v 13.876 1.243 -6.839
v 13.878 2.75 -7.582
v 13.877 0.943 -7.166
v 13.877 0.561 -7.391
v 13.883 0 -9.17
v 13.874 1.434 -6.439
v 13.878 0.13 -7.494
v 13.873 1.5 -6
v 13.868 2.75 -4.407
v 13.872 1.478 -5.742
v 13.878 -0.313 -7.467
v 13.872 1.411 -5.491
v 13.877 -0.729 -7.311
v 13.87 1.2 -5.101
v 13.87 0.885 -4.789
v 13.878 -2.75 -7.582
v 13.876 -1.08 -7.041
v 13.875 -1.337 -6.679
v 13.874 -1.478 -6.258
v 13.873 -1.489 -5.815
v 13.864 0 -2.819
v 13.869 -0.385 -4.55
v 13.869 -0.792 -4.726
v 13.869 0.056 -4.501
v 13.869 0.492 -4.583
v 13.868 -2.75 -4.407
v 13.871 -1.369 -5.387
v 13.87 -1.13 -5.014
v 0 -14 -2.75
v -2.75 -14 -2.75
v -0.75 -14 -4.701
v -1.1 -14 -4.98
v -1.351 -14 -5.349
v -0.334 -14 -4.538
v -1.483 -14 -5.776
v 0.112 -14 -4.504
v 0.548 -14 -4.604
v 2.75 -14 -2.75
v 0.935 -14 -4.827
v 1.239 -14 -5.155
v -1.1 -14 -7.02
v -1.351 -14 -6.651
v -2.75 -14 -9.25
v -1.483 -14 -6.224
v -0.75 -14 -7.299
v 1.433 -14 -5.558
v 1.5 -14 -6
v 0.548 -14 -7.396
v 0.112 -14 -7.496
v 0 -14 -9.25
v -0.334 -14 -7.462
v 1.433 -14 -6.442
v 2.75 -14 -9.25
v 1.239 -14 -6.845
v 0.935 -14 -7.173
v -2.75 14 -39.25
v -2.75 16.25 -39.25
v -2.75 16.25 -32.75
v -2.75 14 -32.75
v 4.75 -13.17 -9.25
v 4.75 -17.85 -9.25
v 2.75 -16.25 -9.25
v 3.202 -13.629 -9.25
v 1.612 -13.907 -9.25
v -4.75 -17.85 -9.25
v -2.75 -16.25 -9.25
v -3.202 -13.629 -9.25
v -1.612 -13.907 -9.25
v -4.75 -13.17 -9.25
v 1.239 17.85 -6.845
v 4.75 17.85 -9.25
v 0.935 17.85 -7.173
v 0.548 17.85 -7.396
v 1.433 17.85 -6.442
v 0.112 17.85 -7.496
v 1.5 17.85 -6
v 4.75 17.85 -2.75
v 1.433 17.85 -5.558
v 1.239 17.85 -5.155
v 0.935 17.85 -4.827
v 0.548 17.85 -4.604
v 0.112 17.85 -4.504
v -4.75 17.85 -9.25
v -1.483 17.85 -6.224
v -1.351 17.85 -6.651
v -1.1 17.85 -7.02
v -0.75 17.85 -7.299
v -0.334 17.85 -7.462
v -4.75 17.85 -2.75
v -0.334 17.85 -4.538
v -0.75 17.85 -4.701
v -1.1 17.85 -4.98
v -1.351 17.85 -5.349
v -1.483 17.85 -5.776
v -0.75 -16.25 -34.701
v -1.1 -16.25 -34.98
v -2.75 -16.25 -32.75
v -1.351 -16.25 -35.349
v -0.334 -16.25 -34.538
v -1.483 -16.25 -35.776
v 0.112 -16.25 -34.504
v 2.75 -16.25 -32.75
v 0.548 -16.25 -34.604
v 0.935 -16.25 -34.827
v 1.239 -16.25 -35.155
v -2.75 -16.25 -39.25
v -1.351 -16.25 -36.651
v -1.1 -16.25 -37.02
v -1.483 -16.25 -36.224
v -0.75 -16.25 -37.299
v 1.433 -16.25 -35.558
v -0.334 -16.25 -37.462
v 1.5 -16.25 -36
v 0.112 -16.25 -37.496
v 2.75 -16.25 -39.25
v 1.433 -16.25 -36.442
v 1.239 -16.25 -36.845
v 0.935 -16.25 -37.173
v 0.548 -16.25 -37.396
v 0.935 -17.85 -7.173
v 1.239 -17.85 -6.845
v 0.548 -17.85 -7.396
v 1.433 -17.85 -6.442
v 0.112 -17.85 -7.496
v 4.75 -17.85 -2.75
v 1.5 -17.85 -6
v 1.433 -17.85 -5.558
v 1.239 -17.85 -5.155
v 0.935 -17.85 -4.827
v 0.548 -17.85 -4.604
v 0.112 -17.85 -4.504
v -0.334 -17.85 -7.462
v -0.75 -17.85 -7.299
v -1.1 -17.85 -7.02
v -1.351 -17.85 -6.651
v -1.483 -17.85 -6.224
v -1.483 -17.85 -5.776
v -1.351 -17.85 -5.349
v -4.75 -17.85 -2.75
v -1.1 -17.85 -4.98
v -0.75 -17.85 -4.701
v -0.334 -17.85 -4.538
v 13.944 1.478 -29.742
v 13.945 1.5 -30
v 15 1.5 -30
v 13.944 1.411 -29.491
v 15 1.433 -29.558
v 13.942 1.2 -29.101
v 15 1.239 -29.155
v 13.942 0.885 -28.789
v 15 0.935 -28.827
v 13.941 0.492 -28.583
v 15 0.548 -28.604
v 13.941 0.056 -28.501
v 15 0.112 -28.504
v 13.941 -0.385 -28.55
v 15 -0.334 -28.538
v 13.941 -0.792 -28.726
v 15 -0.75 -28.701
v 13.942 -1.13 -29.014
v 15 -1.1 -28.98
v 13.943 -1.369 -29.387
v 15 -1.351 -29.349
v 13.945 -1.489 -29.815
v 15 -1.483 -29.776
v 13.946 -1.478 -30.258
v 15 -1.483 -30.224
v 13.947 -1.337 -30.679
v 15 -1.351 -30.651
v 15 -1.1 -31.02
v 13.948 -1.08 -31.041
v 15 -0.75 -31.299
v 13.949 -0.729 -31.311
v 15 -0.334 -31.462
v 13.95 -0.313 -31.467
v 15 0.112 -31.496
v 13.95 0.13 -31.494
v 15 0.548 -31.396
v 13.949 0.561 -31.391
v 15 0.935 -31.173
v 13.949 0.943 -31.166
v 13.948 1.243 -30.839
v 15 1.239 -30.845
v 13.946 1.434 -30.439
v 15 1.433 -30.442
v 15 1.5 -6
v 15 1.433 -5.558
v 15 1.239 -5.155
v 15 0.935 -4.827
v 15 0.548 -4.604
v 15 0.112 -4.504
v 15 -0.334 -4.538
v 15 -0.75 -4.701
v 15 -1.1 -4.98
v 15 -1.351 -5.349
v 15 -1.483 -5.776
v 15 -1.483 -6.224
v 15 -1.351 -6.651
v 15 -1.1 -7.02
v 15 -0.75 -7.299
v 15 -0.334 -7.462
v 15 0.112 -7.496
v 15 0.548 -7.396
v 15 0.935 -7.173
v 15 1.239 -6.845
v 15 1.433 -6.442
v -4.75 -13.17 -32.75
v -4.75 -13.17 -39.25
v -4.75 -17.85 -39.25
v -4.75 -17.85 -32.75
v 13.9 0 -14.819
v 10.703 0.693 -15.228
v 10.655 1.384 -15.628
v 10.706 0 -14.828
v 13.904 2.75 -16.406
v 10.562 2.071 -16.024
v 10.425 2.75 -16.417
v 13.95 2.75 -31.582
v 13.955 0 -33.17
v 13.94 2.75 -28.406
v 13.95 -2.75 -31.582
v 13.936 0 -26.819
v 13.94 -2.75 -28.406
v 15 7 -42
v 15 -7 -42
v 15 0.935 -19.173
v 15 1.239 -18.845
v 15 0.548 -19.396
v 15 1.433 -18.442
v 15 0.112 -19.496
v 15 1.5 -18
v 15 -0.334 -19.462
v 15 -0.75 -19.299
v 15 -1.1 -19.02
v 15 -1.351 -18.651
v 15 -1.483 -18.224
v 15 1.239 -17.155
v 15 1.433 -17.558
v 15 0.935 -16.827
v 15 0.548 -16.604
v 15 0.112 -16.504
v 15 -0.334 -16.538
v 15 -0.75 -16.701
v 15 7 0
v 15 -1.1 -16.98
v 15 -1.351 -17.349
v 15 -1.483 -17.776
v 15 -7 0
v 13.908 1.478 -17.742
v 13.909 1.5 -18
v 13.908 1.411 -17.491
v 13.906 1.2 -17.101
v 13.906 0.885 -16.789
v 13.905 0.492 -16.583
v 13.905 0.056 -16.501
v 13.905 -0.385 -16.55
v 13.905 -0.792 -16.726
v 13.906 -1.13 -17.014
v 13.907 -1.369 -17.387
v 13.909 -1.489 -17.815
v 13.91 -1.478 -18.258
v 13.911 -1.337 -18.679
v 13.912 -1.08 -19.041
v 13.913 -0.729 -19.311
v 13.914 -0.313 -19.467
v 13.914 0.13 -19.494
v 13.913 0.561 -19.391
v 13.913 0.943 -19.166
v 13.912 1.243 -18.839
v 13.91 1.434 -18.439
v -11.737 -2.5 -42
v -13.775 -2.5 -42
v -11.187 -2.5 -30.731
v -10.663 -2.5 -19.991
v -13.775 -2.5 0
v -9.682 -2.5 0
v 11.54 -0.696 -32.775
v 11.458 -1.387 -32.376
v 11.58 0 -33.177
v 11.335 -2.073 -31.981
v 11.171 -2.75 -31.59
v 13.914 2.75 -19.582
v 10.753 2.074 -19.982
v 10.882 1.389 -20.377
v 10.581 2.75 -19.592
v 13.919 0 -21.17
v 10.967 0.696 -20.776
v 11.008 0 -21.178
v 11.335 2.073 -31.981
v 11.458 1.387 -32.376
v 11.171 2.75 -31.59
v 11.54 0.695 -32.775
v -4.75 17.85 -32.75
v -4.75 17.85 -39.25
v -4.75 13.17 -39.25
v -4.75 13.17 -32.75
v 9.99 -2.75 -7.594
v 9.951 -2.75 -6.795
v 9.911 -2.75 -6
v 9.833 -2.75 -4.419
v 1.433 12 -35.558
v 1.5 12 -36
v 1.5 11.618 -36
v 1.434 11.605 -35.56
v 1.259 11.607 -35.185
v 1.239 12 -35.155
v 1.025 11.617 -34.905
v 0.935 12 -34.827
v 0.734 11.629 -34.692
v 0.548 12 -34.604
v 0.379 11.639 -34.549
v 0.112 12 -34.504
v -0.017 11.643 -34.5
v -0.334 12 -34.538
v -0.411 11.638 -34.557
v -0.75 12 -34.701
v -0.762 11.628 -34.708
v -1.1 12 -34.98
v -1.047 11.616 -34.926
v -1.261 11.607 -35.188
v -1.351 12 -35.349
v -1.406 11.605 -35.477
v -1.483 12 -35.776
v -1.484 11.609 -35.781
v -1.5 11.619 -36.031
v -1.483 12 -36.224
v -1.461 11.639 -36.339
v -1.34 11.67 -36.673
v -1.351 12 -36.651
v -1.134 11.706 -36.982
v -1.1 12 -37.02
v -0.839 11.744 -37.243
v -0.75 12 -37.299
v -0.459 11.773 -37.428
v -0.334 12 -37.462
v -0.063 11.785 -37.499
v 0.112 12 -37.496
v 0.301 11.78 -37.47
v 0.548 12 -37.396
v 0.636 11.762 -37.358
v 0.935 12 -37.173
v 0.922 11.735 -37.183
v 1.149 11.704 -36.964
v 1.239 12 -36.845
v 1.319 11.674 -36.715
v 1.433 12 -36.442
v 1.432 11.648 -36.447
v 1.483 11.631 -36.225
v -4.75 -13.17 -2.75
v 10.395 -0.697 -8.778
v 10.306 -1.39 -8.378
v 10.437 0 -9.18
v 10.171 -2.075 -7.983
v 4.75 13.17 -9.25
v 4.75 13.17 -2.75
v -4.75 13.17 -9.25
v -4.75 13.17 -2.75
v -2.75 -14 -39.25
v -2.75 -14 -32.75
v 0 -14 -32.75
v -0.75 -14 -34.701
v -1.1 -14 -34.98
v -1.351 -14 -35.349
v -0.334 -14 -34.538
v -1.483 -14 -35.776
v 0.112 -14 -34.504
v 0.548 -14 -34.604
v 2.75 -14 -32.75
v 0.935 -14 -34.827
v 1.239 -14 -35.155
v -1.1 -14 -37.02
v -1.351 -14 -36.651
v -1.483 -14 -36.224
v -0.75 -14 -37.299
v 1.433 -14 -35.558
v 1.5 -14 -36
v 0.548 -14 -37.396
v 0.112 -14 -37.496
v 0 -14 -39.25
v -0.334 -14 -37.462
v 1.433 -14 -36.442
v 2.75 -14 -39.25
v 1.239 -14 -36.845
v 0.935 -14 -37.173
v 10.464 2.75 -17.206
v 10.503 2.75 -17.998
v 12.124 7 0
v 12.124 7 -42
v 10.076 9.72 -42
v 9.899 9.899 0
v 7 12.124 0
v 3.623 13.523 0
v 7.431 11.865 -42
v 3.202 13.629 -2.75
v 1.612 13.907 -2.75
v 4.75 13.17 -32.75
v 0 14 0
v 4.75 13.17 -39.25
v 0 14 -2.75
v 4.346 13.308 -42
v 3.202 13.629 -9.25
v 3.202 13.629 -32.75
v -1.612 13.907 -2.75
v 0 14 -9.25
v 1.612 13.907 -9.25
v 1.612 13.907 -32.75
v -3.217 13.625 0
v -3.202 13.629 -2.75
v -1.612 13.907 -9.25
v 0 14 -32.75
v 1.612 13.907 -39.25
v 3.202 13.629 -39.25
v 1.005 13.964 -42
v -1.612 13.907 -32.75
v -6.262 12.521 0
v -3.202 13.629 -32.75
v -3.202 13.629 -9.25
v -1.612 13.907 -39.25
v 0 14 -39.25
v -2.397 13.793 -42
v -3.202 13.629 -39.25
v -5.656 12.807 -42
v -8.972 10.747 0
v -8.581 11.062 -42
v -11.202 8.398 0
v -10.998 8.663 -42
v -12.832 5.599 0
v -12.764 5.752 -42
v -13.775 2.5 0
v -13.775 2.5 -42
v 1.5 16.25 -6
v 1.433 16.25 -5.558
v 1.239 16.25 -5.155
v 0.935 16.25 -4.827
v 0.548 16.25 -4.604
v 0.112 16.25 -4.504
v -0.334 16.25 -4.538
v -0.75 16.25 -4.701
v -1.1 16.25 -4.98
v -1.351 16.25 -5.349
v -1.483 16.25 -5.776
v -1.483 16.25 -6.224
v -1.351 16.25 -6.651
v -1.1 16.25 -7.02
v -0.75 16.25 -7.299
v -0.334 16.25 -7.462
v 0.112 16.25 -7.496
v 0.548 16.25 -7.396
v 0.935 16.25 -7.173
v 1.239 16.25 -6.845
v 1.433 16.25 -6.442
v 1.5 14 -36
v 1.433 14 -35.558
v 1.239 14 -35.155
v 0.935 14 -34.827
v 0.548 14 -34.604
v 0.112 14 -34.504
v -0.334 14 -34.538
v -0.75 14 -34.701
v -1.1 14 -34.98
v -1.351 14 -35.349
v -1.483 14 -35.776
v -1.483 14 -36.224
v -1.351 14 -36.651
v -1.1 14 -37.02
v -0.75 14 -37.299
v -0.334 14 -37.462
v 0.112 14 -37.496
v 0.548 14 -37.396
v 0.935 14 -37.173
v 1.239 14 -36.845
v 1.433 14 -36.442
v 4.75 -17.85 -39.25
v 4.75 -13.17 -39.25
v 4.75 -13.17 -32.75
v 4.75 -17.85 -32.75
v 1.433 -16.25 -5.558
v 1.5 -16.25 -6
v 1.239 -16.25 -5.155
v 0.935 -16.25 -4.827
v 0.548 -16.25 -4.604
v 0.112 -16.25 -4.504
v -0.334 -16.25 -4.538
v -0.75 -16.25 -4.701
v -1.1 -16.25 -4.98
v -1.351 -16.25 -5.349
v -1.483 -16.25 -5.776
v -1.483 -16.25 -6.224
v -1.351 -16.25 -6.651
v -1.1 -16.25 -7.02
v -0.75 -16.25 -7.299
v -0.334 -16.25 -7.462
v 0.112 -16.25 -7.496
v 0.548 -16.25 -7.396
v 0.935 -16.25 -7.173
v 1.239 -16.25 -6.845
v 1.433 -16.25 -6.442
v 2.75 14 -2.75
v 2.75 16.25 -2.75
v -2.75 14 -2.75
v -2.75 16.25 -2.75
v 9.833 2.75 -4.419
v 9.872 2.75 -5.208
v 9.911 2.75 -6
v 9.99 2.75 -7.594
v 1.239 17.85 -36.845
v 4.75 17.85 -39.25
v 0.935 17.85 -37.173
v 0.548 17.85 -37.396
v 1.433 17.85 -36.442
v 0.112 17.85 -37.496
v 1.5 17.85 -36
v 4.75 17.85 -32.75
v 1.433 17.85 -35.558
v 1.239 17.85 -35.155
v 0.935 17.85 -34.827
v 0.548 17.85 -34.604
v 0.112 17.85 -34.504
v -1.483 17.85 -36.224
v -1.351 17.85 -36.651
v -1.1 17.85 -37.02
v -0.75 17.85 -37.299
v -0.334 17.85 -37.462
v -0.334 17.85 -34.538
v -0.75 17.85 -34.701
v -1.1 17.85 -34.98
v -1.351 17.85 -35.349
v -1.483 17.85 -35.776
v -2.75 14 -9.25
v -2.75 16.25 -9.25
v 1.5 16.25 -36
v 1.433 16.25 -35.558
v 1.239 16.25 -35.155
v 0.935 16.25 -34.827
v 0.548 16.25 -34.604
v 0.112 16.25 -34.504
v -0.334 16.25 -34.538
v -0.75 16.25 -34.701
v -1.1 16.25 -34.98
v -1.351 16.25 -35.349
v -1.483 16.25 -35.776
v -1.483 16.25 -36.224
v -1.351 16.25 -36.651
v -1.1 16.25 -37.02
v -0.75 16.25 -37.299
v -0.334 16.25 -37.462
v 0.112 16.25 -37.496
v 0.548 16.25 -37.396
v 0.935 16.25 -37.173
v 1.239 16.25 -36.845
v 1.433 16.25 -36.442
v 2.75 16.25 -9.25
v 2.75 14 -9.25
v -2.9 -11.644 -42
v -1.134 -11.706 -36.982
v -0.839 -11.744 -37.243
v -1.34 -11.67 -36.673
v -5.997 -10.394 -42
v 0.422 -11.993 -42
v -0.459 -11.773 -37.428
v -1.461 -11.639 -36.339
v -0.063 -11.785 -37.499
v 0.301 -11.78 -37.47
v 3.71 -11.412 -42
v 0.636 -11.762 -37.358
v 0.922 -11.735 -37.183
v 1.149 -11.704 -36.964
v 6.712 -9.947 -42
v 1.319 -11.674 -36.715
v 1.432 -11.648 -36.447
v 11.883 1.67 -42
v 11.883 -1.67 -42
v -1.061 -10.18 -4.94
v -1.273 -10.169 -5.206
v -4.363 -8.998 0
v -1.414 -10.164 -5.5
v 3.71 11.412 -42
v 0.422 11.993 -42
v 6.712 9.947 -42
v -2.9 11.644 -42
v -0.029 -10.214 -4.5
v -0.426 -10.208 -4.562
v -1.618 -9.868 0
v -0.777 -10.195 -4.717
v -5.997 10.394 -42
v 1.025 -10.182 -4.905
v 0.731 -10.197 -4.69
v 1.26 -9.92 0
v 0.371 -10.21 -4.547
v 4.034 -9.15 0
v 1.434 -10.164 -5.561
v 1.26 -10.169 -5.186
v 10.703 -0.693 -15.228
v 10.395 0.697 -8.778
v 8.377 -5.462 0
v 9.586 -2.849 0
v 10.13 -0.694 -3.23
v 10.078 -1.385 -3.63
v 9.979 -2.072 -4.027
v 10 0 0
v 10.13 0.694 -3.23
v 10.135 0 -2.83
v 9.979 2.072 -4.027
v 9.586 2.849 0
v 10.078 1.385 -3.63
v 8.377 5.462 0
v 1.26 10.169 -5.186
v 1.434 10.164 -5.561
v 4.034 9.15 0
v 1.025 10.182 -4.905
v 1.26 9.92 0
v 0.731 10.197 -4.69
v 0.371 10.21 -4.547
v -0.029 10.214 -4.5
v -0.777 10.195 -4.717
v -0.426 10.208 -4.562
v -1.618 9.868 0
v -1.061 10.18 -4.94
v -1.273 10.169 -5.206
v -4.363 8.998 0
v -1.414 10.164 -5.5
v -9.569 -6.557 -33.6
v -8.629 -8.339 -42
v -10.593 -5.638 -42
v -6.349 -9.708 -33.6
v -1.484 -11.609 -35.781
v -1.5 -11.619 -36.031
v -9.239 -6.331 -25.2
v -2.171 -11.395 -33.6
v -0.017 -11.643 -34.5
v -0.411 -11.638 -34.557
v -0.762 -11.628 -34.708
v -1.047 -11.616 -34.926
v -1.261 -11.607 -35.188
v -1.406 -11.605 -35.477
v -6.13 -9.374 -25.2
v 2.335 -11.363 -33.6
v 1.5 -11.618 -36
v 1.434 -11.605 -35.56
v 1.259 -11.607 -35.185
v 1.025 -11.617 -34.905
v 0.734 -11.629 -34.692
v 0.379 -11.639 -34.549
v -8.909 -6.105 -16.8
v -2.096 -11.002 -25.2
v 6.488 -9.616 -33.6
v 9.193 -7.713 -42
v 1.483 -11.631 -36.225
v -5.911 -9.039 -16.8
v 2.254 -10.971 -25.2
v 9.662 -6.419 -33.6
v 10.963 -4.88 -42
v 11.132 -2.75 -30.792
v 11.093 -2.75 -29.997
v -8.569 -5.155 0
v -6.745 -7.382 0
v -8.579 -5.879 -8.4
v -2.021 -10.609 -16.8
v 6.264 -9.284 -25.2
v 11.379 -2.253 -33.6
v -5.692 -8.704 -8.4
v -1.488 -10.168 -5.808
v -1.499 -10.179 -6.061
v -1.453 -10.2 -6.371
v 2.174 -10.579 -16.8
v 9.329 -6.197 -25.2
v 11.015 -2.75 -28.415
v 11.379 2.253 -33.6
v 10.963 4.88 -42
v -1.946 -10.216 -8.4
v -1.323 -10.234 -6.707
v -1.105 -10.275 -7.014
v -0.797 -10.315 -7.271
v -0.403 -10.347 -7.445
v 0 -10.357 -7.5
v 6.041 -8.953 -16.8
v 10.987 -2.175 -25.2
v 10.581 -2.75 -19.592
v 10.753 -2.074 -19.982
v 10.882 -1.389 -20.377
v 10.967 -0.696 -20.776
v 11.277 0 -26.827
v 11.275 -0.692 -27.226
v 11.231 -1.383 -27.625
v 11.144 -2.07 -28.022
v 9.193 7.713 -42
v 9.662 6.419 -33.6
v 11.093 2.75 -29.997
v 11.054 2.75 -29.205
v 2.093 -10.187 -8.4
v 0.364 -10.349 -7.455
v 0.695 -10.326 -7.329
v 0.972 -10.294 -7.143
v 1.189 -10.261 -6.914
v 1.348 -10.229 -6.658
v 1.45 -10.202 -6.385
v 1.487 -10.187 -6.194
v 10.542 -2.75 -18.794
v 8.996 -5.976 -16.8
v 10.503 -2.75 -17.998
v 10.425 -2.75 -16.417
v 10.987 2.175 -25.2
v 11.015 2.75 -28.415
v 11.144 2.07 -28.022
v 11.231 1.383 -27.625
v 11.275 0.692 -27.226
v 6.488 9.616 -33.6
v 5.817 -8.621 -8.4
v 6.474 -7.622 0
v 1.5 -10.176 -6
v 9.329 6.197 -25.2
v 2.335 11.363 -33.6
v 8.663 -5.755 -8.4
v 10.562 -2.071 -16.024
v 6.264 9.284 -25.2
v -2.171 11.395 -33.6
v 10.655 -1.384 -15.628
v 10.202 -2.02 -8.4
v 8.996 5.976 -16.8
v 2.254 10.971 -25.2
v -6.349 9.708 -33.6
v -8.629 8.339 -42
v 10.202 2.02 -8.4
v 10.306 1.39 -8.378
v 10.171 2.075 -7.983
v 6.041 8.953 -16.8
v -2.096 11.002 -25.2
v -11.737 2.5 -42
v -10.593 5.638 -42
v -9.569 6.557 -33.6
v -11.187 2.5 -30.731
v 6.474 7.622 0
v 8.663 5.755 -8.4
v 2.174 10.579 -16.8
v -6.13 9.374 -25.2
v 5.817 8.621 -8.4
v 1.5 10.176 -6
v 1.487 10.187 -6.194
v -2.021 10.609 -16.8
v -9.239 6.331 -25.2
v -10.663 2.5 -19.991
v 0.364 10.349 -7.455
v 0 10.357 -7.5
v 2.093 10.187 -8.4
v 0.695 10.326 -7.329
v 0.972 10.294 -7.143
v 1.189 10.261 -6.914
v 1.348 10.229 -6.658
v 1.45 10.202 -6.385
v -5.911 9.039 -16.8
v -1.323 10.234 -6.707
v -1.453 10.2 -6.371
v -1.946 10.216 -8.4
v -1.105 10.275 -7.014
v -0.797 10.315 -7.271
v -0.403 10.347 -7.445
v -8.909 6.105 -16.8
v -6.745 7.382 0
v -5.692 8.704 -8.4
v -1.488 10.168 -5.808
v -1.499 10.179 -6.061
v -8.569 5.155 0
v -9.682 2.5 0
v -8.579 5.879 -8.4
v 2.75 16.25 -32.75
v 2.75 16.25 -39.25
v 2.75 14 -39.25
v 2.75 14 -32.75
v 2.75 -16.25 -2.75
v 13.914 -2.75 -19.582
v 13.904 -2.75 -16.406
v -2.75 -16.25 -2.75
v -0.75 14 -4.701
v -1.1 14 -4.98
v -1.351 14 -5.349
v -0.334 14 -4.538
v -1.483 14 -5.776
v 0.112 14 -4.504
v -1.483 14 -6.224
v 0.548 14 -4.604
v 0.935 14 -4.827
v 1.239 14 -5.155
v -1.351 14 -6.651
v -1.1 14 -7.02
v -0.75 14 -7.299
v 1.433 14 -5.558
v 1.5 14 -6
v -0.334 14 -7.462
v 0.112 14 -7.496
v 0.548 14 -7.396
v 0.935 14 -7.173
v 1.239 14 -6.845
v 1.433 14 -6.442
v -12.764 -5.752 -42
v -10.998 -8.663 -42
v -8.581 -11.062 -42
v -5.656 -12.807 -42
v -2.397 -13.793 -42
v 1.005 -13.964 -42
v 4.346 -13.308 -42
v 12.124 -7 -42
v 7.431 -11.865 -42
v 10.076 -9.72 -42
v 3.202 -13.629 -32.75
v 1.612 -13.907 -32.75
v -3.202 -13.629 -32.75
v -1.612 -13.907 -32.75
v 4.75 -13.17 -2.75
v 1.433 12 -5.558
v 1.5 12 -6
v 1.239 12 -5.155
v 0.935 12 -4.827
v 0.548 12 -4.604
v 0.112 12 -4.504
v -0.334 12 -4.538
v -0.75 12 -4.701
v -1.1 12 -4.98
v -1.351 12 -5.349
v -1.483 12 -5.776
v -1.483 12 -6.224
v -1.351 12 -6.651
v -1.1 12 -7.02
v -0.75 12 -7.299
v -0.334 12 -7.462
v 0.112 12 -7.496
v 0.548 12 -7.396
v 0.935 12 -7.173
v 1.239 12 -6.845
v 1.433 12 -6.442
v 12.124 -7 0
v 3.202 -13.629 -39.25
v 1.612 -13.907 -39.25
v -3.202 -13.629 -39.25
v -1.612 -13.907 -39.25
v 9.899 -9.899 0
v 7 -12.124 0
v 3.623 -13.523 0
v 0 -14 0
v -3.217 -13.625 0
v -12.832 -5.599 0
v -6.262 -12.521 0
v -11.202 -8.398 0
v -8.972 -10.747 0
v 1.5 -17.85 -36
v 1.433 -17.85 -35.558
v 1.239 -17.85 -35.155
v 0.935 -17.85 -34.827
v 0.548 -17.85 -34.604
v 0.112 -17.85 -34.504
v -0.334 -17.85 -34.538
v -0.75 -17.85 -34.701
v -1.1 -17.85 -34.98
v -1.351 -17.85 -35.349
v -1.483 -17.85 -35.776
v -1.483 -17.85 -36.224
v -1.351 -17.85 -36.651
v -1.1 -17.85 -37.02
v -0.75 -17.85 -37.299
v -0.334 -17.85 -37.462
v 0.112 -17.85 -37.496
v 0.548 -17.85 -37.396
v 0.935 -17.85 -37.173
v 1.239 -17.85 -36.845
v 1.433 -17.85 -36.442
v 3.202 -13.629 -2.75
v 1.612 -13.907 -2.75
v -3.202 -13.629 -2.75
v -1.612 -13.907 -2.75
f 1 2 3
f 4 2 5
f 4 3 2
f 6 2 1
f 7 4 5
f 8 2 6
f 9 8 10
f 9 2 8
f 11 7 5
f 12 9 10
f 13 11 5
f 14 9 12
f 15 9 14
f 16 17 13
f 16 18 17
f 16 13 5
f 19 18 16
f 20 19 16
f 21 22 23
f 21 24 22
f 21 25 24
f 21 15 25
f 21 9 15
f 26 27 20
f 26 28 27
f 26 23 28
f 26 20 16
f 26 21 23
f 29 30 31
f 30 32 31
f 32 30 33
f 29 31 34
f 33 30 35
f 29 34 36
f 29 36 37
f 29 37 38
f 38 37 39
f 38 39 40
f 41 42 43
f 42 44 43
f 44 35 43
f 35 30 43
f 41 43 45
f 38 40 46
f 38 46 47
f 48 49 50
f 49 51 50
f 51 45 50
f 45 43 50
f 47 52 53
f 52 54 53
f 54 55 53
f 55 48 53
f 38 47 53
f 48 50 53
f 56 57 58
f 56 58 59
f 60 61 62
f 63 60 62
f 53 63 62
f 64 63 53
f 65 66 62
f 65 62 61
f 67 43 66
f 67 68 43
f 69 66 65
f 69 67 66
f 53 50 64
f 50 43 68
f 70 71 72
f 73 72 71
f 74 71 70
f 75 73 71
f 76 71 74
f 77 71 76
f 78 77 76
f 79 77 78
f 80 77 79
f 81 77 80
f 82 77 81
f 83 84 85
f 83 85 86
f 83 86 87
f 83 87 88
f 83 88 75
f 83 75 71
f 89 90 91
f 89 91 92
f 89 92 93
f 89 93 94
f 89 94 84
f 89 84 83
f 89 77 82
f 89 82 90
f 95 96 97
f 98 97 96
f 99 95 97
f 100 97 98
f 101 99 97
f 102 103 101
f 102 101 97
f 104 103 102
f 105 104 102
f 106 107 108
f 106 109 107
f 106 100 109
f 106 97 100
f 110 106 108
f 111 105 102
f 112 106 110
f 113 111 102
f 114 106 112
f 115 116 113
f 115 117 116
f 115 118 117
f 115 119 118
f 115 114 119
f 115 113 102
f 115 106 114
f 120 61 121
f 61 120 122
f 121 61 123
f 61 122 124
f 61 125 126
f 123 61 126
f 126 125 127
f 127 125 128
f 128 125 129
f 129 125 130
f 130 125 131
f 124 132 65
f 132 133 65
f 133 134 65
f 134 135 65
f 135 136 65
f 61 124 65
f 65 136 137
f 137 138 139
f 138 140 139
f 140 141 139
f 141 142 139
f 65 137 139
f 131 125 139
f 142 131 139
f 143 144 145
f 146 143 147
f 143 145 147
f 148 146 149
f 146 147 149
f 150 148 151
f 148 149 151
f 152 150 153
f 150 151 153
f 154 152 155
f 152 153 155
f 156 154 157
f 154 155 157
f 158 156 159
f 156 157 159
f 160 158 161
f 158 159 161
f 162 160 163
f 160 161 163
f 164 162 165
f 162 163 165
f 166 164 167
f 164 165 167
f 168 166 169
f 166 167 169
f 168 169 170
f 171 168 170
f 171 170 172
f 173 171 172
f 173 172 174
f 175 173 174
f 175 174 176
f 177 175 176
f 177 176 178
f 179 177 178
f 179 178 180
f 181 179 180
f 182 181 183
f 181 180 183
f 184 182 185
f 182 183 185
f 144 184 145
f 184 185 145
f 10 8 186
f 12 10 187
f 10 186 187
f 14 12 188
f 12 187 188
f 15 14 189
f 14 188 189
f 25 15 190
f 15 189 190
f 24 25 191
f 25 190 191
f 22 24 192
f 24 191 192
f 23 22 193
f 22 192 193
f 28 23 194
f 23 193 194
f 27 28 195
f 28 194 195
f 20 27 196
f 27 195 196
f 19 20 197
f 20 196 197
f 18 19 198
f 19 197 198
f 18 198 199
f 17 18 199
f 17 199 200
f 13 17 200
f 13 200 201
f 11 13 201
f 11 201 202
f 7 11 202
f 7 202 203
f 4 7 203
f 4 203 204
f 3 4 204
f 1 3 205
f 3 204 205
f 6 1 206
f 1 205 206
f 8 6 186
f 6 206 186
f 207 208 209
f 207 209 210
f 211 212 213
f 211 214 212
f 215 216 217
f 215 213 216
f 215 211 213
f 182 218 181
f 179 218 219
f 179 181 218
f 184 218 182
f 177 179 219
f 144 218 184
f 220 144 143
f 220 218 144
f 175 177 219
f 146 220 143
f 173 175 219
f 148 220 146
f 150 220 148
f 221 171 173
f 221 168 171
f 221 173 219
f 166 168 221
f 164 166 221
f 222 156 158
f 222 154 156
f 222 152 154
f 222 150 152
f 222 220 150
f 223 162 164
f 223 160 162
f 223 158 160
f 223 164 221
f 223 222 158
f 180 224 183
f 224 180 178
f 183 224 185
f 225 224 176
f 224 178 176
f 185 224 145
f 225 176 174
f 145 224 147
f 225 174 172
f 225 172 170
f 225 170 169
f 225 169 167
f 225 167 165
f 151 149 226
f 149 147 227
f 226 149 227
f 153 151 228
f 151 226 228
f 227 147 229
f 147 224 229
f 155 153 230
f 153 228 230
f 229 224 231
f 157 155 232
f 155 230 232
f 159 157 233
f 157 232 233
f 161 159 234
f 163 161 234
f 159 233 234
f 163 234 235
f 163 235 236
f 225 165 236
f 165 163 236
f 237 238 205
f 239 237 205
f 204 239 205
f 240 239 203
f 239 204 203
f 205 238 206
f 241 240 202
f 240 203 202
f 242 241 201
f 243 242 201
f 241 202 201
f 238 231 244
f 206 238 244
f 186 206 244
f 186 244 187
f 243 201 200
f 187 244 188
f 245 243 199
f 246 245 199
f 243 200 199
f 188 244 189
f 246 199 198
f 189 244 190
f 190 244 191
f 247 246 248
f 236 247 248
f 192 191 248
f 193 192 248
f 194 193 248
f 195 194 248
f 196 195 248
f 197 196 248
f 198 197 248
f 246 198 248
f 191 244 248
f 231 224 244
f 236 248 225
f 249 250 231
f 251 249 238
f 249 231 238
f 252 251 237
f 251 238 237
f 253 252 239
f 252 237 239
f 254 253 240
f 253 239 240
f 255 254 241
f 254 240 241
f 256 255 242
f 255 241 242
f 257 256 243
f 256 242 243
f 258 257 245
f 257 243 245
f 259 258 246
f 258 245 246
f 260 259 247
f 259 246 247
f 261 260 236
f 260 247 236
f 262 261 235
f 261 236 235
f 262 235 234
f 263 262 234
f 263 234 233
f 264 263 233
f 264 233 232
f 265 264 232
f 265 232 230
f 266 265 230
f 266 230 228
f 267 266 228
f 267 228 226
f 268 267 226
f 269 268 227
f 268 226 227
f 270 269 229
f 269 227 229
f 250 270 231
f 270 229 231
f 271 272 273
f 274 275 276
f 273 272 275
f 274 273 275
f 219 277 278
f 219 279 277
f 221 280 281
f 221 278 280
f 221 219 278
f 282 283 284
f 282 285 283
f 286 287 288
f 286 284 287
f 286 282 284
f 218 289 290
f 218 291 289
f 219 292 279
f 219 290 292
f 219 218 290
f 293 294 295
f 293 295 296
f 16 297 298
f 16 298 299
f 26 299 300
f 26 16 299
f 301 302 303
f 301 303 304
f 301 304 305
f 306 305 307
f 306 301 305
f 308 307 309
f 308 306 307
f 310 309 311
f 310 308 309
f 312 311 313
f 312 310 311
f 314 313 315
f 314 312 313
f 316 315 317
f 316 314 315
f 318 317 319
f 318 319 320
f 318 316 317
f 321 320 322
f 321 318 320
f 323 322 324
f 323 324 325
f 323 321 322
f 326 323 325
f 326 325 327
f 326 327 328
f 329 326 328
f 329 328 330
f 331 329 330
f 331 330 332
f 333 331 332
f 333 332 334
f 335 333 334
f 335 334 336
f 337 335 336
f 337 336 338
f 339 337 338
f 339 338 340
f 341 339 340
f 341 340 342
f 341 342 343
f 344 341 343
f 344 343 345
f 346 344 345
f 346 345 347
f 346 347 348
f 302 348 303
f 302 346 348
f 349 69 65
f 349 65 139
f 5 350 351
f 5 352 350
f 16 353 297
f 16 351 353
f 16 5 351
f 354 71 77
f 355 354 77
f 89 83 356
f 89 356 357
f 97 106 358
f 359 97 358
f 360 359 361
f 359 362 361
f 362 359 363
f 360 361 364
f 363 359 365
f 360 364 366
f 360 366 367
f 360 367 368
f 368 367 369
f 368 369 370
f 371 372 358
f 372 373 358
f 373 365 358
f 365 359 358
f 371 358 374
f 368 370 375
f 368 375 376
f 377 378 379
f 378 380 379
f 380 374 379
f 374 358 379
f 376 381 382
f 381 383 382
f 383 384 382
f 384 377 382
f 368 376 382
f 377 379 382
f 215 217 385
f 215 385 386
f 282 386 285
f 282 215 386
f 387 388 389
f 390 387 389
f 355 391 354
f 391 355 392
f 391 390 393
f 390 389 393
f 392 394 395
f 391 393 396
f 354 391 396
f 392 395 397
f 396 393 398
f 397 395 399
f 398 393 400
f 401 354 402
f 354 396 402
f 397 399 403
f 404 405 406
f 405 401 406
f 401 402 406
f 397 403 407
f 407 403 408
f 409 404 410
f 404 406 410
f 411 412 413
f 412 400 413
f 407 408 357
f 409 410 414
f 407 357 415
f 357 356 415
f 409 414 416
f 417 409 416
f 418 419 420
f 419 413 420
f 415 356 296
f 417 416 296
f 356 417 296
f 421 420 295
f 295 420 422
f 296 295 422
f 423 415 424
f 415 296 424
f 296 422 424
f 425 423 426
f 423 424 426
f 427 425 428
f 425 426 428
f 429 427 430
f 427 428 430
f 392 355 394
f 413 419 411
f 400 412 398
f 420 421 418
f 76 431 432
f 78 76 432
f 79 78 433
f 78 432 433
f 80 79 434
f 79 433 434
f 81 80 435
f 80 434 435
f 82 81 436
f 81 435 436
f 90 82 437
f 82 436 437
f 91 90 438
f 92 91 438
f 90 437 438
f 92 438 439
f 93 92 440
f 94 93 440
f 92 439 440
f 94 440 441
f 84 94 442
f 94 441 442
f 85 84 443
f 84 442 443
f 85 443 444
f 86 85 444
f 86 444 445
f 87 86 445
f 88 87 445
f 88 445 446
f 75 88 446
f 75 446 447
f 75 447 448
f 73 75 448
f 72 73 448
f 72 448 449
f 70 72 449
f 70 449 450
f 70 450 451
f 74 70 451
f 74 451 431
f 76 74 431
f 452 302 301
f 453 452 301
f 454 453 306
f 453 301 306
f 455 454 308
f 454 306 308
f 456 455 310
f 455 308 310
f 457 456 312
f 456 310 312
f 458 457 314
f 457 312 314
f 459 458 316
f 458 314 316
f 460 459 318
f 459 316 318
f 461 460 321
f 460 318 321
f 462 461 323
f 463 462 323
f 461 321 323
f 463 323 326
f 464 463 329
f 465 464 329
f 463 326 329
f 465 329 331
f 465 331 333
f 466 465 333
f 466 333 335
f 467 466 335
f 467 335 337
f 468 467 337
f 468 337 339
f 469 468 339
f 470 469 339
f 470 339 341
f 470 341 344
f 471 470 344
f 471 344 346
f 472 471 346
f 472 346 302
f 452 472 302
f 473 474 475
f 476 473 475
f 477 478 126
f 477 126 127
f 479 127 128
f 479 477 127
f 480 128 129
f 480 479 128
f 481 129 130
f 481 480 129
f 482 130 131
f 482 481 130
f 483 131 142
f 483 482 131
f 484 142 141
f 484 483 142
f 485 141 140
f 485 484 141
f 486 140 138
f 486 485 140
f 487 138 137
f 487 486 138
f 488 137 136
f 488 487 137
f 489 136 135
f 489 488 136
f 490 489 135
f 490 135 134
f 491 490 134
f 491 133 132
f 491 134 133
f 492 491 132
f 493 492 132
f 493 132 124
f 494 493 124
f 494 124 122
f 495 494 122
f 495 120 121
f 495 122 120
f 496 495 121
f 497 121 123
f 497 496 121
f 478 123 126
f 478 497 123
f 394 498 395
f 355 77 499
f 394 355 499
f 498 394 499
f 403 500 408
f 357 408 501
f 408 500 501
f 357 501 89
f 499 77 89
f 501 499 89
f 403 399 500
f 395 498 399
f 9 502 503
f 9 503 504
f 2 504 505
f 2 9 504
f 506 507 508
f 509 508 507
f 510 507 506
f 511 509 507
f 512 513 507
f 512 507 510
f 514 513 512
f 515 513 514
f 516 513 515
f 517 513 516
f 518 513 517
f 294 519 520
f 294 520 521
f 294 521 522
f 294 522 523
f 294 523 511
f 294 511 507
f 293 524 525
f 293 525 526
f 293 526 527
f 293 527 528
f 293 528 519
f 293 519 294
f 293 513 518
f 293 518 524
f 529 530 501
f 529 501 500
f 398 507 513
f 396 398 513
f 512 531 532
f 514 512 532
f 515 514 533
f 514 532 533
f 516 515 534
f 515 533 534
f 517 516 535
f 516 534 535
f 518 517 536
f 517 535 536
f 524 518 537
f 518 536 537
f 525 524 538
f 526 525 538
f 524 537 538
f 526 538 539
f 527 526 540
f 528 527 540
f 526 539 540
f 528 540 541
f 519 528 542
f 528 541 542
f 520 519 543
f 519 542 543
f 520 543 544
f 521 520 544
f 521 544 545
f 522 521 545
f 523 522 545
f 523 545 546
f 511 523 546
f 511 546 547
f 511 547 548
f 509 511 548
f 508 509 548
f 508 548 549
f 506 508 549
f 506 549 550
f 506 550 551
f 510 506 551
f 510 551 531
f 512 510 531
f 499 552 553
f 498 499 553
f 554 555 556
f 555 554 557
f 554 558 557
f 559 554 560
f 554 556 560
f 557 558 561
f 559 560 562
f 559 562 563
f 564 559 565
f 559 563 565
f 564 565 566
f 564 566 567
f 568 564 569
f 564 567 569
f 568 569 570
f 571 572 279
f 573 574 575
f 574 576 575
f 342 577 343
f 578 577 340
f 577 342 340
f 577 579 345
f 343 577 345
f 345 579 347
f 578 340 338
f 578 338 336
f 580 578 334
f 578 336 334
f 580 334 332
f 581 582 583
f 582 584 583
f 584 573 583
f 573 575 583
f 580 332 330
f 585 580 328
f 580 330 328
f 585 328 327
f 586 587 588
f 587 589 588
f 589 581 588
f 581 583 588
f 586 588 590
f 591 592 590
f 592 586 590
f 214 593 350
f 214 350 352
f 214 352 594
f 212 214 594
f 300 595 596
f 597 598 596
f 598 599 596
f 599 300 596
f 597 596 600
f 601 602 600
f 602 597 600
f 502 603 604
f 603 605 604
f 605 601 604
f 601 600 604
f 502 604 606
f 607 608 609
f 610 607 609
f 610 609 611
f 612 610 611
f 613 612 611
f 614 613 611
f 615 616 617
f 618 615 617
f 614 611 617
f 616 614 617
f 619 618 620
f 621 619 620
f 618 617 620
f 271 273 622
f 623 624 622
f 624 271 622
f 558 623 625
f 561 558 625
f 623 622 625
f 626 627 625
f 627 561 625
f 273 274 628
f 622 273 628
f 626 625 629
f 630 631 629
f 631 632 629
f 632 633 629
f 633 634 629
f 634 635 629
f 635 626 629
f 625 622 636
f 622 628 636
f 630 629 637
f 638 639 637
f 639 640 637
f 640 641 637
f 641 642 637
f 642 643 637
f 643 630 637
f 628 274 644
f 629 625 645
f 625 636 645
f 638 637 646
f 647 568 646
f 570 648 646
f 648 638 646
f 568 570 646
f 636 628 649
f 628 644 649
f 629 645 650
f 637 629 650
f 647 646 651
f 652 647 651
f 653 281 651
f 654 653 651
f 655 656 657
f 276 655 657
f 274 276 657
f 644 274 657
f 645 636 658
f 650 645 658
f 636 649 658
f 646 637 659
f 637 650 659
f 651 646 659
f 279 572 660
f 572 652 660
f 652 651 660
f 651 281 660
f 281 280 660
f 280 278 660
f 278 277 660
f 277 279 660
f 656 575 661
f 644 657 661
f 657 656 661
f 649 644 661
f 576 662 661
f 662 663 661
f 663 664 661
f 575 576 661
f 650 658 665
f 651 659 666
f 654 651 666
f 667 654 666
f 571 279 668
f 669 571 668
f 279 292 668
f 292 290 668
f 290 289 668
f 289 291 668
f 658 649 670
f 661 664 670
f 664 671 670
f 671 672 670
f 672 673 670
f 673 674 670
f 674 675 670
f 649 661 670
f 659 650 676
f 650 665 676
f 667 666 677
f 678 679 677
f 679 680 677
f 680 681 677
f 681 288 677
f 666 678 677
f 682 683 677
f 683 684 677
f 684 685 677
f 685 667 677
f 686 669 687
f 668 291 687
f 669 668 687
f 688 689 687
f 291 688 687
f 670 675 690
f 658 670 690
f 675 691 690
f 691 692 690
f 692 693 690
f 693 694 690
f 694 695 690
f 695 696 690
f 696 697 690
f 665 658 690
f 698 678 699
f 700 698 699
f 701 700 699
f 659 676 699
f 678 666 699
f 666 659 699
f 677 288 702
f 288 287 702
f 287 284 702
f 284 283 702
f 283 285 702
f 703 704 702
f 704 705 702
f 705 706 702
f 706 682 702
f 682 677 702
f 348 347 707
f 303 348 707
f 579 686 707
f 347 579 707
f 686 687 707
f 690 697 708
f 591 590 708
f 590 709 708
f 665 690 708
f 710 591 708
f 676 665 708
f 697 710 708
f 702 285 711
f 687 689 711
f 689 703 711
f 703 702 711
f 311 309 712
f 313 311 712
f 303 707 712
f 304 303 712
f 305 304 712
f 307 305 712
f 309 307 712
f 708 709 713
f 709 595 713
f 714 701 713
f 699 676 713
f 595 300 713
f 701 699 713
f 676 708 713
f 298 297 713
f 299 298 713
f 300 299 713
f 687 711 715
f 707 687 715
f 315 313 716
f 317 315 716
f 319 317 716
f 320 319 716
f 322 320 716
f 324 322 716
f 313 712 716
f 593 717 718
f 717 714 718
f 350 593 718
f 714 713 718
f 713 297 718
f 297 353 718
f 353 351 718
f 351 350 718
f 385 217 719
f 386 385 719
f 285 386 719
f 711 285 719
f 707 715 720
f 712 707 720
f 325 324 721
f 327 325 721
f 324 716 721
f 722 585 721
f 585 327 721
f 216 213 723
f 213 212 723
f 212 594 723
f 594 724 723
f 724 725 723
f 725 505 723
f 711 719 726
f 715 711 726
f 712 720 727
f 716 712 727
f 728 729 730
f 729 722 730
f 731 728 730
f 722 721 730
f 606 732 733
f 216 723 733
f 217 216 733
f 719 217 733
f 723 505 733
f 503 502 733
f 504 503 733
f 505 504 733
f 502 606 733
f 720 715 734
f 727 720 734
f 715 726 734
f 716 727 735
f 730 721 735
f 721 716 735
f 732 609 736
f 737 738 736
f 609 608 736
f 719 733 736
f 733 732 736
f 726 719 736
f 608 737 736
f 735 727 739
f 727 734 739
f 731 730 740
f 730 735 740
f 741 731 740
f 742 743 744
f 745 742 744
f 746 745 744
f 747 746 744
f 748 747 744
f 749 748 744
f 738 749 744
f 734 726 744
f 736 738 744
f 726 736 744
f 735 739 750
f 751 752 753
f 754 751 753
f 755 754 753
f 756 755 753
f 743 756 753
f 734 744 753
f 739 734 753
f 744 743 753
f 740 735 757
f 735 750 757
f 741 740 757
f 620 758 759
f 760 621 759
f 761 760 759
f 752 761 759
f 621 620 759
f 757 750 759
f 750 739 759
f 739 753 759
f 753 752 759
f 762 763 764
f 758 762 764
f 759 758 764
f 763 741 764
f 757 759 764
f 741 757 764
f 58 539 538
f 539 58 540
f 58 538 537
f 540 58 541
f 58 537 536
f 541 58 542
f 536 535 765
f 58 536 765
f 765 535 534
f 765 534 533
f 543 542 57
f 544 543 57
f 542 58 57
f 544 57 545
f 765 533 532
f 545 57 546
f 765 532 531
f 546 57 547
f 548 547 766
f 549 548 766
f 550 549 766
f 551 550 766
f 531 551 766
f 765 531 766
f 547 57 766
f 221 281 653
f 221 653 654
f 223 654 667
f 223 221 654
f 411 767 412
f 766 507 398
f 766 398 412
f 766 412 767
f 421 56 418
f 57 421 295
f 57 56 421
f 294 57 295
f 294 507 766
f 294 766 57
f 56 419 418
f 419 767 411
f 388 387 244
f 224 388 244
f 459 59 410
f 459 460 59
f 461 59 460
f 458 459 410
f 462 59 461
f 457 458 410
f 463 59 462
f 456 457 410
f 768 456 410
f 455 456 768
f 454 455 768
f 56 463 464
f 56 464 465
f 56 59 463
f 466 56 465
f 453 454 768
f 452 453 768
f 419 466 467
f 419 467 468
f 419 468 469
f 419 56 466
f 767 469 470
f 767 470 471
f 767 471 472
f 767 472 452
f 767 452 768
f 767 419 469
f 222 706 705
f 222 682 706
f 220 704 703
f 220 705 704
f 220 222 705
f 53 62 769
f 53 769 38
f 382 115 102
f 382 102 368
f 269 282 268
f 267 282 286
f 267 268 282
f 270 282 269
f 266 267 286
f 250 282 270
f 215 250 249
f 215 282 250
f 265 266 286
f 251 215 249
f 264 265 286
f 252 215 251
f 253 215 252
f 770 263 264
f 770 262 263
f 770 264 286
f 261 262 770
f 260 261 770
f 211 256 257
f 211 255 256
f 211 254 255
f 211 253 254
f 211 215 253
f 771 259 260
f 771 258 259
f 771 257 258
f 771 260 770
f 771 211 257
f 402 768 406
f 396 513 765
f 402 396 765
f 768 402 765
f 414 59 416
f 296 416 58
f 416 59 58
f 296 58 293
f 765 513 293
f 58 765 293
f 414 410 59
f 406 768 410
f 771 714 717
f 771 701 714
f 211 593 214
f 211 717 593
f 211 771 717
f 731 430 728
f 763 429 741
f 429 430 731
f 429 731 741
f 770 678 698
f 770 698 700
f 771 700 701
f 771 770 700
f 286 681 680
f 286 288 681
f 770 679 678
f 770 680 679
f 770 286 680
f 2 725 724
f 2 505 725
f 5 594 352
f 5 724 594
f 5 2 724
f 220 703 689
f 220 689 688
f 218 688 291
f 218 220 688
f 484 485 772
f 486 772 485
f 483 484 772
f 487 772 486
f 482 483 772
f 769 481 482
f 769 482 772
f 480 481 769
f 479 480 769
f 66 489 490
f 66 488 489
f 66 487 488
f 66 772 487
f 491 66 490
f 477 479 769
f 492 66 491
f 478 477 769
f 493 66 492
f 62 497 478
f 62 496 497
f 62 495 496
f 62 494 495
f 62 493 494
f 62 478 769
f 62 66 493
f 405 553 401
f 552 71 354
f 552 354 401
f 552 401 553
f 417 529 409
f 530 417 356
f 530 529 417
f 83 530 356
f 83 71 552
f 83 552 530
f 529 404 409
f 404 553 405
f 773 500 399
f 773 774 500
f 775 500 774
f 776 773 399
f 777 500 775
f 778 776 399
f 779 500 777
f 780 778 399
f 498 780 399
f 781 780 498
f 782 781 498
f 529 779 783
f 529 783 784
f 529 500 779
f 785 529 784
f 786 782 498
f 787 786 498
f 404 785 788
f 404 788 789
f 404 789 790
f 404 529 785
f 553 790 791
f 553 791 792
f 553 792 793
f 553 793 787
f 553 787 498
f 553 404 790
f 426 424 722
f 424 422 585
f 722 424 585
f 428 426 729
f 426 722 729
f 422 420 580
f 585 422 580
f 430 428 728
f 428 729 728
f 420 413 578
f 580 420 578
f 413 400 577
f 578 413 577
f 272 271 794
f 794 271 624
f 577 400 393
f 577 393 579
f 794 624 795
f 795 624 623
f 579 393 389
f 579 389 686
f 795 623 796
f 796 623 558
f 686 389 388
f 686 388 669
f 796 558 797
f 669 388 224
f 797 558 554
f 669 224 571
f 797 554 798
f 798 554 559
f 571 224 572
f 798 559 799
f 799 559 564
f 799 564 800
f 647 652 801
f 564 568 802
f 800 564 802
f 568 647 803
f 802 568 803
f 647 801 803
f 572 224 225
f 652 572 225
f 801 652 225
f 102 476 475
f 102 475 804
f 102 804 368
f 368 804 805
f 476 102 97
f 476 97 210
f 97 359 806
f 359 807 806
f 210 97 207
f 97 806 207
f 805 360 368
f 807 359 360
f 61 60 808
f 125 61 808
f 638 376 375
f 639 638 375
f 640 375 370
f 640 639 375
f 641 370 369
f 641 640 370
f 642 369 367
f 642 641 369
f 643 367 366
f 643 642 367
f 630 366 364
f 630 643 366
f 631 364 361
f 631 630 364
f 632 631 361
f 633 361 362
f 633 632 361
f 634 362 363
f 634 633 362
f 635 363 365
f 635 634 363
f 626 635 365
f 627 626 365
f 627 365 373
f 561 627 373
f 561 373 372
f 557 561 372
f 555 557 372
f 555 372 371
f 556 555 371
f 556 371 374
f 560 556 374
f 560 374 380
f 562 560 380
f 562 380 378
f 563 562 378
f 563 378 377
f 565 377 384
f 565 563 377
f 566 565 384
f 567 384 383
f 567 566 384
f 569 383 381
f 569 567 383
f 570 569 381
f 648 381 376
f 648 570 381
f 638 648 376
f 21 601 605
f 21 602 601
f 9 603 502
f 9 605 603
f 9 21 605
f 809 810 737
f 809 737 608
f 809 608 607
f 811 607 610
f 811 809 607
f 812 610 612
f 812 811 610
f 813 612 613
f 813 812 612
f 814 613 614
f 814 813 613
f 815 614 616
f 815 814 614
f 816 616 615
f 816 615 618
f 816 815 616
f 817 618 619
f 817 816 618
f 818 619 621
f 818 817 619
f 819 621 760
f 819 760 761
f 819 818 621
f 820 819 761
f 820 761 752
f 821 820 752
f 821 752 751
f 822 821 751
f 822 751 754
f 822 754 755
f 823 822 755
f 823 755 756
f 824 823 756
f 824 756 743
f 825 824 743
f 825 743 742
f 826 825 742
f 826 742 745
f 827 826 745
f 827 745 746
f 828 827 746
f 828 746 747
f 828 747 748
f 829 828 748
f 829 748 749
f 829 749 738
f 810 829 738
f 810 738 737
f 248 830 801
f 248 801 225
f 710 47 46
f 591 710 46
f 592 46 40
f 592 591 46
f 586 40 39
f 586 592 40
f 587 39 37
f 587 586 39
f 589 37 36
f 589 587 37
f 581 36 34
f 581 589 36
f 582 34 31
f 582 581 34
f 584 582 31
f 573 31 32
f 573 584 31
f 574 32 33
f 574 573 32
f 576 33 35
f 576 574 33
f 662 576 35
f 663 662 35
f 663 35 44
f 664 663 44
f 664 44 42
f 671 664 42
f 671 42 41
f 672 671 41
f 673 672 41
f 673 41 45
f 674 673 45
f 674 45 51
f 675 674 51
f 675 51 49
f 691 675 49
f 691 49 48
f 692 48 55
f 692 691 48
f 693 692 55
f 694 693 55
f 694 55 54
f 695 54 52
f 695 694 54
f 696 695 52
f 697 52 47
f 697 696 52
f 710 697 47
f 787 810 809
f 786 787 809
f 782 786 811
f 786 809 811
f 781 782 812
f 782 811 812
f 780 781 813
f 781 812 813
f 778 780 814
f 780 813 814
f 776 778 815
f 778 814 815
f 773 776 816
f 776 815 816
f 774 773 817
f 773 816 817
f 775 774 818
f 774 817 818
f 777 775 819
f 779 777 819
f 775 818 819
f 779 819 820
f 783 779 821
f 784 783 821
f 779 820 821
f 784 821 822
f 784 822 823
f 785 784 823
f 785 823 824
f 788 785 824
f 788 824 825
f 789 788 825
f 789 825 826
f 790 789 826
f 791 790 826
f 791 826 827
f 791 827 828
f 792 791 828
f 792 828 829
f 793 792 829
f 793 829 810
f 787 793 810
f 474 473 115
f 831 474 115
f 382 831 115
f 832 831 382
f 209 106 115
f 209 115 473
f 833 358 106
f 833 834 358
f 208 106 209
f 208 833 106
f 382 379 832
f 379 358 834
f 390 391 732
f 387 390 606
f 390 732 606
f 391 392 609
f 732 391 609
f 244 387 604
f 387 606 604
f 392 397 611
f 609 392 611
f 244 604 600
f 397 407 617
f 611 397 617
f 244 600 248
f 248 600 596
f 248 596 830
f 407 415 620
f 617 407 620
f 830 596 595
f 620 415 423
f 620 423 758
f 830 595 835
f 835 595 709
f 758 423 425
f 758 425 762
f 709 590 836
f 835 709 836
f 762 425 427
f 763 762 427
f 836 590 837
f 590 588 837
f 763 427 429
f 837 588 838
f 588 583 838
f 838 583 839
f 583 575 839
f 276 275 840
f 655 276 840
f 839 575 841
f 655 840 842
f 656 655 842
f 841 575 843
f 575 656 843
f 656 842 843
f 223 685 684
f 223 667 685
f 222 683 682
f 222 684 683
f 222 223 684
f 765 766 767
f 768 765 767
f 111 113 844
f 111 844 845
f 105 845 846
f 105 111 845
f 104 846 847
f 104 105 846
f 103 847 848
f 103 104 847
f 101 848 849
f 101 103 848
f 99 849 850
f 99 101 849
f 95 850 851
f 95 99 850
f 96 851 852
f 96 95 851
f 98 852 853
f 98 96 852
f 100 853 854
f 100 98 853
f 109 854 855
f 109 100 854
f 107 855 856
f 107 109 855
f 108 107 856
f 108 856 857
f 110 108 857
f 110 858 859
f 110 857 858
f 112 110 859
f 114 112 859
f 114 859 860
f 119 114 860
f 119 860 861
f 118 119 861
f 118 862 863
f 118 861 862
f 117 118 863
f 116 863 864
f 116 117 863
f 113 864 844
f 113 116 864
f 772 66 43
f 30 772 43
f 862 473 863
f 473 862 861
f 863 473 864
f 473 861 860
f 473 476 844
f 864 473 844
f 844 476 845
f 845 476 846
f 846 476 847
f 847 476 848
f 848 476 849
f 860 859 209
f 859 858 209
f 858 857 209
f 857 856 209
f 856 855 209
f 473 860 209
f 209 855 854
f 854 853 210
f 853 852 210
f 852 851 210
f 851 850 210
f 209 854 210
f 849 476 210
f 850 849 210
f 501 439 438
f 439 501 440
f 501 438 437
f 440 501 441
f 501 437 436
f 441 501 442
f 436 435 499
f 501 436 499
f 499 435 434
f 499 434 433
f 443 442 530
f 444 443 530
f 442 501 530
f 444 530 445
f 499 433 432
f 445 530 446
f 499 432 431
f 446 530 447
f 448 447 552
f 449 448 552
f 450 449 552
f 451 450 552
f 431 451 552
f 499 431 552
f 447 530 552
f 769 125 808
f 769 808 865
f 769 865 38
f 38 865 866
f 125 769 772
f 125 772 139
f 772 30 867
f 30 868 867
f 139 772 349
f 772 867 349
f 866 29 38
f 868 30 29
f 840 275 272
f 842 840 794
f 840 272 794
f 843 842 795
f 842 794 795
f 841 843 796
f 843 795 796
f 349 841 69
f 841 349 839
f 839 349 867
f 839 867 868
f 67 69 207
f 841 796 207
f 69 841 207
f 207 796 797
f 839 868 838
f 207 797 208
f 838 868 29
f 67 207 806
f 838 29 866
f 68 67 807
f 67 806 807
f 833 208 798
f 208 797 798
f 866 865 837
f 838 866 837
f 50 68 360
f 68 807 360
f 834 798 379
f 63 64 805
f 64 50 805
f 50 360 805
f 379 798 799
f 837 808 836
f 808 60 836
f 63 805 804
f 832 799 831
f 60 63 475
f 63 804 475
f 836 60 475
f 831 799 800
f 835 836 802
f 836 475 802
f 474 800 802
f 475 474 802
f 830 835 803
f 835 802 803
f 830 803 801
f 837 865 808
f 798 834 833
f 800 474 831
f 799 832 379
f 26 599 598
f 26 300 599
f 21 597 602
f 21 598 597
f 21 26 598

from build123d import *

# Parameters (mm, degrees)
SKETCH014_W          = 14
SKETCH014_H          = 3
PAD006_DEPTH         = 42
SKETCH015_R          = 1.5
POCKET007_DEPTH      = 5
POCKET008_DEPTH      = 2
POCKET008_DEPTH_BACK = 3
SKETCH018_W          = 5
SKETCH018_H          = 15
POCKET009_DEPTH      = 43
SKETCH020_W          = 9.5
SKETCH020_H          = 6.5
PAD008_DEPTH         = 3.85
PAD008_DEPTH_BACK    = 1
SKETCH019_R          = 1.5
POCKET010_DEPTH      = 8
POCKET010_DEPTH_BACK = 100
SKETCH021_W          = 2.25
SKETCH021_H          = 5.5
POCKET011_DEPTH      = 42


with BuildPart() as part:
    # Sketch013 → Revolution (revolve)
    with BuildSketch(Plane.YZ):
        Polygon((10, 0), (14, 0), (14, -42), (12, -42), align=None)
    revolve(axis=Axis((0, 0, 0), (0, 0, 1)))

    # Sketch014 (on Face1 of Revolution) → Pad006 (new body)
    with BuildSketch(Plane(origin=(0, 0, 0), x_dir=(0, -1, 0), z_dir=(0, 0, 1))):
        with Locations((0, 13.5)):
            Rectangle(SKETCH014_W, SKETCH014_H)
    extrude(amount=-PAD006_DEPTH)

    # Sketch015 (on Face11 of Pad006) → Pocket007 (cut)
    with BuildSketch(Plane.YZ.offset(15)):
        with Locations((0, -6)):
            Circle(SKETCH015_R)
        with Locations((0, -18)):
            Circle(SKETCH015_R)
        with Locations((0, -30)):
            Circle(SKETCH015_R)
    extrude(amount=-POCKET007_DEPTH, mode=Mode.SUBTRACT)

    # Sketch016 (on DatumPlane) → Pocket008 (cut, two sides)
    with BuildSketch(Plane(origin=(11.920048, -2.3e-05, -21.627207), x_dir=(-2e-06, -1, 0), z_dir=(-0.999996, 2e-06, -0.003))) as pocket008_sk:
        Polygon((2.75, 14.039346), (2.75, 17.214772), (0, 18.802485), (-2.75, 17.214772), (-2.75, 14.039346), (0, 12.451632), align=None)
        Polygon((2.75, 2.039346), (2.75, 5.214772), (0, 6.802485), (-2.75, 5.214772), (-2.75, 2.039346), (0, 0.451632), align=None)
        Polygon((2.75, -9.960654), (2.75, -6.785228), (0, -5.197515), (-2.75, -6.785228), (-2.75, -9.960654), (0, -11.548368), align=None)
    extrude(amount=-POCKET008_DEPTH, mode=Mode.SUBTRACT)
    extrude(pocket008_sk.sketch, amount=POCKET008_DEPTH_BACK, mode=Mode.SUBTRACT)

    # Sketch018 (on Face1 of Pocket008) → Pocket009 (cut)
    with BuildSketch(Plane(origin=(0, 0, 0), x_dir=(0, -1, 0), z_dir=(0, 0, 1))):
        with Locations((0, -7.5)):
            Rectangle(SKETCH018_W, SKETCH018_H)
    extrude(amount=-POCKET009_DEPTH, mode=Mode.SUBTRACT)

    # Sketch020 (on DatumPlane) → Pad008 (join, two sides)
    with BuildSketch(Plane(origin=(15, 14, 0), x_dir=(-1, 0, 0), z_dir=(0, 1, 0))) as pad008_sk:
        with Locations((15, -6)):
            Rectangle(SKETCH020_W, SKETCH020_H)
        with Locations((15, -36)):
            Rectangle(SKETCH020_W, SKETCH020_H)
    pad008 = extrude(amount=PAD008_DEPTH) + extrude(pad008_sk.sketch, amount=-PAD008_DEPTH_BACK)

    # Mirrored: Pad008 across XZ
    add(pad008.mirror(Plane.XZ))

    # Sketch019 (on DatumPlane) → Pocket010 (cut, two sides)
    with BuildSketch(Plane(origin=(15, 12, 0), x_dir=(1, 0, 0), z_dir=(0, -1, 0))) as pocket010_sk:
        with Locations((-15, -6)):
            Circle(SKETCH019_R)
        with Locations((-15, -36)):
            Circle(SKETCH019_R)
    extrude(amount=-POCKET010_DEPTH, mode=Mode.SUBTRACT)
    extrude(pocket010_sk.sketch, amount=POCKET010_DEPTH_BACK, mode=Mode.SUBTRACT)

    # Sketch021 (on Face17 of Pocket010) → Pocket011 (cut)
    with BuildSketch(Plane.YX.offset(39.25)):
        with Locations((-15.125, 0)):
            Rectangle(SKETCH021_W, SKETCH021_H)
    pocket011 = extrude(amount=-POCKET011_DEPTH, mode=Mode.SUBTRACT)

    # Mirrored001: Pocket011 across XZ
    add(pocket011.mirror(Plane.XZ), mode=Mode.SUBTRACT)


solid = part.part
